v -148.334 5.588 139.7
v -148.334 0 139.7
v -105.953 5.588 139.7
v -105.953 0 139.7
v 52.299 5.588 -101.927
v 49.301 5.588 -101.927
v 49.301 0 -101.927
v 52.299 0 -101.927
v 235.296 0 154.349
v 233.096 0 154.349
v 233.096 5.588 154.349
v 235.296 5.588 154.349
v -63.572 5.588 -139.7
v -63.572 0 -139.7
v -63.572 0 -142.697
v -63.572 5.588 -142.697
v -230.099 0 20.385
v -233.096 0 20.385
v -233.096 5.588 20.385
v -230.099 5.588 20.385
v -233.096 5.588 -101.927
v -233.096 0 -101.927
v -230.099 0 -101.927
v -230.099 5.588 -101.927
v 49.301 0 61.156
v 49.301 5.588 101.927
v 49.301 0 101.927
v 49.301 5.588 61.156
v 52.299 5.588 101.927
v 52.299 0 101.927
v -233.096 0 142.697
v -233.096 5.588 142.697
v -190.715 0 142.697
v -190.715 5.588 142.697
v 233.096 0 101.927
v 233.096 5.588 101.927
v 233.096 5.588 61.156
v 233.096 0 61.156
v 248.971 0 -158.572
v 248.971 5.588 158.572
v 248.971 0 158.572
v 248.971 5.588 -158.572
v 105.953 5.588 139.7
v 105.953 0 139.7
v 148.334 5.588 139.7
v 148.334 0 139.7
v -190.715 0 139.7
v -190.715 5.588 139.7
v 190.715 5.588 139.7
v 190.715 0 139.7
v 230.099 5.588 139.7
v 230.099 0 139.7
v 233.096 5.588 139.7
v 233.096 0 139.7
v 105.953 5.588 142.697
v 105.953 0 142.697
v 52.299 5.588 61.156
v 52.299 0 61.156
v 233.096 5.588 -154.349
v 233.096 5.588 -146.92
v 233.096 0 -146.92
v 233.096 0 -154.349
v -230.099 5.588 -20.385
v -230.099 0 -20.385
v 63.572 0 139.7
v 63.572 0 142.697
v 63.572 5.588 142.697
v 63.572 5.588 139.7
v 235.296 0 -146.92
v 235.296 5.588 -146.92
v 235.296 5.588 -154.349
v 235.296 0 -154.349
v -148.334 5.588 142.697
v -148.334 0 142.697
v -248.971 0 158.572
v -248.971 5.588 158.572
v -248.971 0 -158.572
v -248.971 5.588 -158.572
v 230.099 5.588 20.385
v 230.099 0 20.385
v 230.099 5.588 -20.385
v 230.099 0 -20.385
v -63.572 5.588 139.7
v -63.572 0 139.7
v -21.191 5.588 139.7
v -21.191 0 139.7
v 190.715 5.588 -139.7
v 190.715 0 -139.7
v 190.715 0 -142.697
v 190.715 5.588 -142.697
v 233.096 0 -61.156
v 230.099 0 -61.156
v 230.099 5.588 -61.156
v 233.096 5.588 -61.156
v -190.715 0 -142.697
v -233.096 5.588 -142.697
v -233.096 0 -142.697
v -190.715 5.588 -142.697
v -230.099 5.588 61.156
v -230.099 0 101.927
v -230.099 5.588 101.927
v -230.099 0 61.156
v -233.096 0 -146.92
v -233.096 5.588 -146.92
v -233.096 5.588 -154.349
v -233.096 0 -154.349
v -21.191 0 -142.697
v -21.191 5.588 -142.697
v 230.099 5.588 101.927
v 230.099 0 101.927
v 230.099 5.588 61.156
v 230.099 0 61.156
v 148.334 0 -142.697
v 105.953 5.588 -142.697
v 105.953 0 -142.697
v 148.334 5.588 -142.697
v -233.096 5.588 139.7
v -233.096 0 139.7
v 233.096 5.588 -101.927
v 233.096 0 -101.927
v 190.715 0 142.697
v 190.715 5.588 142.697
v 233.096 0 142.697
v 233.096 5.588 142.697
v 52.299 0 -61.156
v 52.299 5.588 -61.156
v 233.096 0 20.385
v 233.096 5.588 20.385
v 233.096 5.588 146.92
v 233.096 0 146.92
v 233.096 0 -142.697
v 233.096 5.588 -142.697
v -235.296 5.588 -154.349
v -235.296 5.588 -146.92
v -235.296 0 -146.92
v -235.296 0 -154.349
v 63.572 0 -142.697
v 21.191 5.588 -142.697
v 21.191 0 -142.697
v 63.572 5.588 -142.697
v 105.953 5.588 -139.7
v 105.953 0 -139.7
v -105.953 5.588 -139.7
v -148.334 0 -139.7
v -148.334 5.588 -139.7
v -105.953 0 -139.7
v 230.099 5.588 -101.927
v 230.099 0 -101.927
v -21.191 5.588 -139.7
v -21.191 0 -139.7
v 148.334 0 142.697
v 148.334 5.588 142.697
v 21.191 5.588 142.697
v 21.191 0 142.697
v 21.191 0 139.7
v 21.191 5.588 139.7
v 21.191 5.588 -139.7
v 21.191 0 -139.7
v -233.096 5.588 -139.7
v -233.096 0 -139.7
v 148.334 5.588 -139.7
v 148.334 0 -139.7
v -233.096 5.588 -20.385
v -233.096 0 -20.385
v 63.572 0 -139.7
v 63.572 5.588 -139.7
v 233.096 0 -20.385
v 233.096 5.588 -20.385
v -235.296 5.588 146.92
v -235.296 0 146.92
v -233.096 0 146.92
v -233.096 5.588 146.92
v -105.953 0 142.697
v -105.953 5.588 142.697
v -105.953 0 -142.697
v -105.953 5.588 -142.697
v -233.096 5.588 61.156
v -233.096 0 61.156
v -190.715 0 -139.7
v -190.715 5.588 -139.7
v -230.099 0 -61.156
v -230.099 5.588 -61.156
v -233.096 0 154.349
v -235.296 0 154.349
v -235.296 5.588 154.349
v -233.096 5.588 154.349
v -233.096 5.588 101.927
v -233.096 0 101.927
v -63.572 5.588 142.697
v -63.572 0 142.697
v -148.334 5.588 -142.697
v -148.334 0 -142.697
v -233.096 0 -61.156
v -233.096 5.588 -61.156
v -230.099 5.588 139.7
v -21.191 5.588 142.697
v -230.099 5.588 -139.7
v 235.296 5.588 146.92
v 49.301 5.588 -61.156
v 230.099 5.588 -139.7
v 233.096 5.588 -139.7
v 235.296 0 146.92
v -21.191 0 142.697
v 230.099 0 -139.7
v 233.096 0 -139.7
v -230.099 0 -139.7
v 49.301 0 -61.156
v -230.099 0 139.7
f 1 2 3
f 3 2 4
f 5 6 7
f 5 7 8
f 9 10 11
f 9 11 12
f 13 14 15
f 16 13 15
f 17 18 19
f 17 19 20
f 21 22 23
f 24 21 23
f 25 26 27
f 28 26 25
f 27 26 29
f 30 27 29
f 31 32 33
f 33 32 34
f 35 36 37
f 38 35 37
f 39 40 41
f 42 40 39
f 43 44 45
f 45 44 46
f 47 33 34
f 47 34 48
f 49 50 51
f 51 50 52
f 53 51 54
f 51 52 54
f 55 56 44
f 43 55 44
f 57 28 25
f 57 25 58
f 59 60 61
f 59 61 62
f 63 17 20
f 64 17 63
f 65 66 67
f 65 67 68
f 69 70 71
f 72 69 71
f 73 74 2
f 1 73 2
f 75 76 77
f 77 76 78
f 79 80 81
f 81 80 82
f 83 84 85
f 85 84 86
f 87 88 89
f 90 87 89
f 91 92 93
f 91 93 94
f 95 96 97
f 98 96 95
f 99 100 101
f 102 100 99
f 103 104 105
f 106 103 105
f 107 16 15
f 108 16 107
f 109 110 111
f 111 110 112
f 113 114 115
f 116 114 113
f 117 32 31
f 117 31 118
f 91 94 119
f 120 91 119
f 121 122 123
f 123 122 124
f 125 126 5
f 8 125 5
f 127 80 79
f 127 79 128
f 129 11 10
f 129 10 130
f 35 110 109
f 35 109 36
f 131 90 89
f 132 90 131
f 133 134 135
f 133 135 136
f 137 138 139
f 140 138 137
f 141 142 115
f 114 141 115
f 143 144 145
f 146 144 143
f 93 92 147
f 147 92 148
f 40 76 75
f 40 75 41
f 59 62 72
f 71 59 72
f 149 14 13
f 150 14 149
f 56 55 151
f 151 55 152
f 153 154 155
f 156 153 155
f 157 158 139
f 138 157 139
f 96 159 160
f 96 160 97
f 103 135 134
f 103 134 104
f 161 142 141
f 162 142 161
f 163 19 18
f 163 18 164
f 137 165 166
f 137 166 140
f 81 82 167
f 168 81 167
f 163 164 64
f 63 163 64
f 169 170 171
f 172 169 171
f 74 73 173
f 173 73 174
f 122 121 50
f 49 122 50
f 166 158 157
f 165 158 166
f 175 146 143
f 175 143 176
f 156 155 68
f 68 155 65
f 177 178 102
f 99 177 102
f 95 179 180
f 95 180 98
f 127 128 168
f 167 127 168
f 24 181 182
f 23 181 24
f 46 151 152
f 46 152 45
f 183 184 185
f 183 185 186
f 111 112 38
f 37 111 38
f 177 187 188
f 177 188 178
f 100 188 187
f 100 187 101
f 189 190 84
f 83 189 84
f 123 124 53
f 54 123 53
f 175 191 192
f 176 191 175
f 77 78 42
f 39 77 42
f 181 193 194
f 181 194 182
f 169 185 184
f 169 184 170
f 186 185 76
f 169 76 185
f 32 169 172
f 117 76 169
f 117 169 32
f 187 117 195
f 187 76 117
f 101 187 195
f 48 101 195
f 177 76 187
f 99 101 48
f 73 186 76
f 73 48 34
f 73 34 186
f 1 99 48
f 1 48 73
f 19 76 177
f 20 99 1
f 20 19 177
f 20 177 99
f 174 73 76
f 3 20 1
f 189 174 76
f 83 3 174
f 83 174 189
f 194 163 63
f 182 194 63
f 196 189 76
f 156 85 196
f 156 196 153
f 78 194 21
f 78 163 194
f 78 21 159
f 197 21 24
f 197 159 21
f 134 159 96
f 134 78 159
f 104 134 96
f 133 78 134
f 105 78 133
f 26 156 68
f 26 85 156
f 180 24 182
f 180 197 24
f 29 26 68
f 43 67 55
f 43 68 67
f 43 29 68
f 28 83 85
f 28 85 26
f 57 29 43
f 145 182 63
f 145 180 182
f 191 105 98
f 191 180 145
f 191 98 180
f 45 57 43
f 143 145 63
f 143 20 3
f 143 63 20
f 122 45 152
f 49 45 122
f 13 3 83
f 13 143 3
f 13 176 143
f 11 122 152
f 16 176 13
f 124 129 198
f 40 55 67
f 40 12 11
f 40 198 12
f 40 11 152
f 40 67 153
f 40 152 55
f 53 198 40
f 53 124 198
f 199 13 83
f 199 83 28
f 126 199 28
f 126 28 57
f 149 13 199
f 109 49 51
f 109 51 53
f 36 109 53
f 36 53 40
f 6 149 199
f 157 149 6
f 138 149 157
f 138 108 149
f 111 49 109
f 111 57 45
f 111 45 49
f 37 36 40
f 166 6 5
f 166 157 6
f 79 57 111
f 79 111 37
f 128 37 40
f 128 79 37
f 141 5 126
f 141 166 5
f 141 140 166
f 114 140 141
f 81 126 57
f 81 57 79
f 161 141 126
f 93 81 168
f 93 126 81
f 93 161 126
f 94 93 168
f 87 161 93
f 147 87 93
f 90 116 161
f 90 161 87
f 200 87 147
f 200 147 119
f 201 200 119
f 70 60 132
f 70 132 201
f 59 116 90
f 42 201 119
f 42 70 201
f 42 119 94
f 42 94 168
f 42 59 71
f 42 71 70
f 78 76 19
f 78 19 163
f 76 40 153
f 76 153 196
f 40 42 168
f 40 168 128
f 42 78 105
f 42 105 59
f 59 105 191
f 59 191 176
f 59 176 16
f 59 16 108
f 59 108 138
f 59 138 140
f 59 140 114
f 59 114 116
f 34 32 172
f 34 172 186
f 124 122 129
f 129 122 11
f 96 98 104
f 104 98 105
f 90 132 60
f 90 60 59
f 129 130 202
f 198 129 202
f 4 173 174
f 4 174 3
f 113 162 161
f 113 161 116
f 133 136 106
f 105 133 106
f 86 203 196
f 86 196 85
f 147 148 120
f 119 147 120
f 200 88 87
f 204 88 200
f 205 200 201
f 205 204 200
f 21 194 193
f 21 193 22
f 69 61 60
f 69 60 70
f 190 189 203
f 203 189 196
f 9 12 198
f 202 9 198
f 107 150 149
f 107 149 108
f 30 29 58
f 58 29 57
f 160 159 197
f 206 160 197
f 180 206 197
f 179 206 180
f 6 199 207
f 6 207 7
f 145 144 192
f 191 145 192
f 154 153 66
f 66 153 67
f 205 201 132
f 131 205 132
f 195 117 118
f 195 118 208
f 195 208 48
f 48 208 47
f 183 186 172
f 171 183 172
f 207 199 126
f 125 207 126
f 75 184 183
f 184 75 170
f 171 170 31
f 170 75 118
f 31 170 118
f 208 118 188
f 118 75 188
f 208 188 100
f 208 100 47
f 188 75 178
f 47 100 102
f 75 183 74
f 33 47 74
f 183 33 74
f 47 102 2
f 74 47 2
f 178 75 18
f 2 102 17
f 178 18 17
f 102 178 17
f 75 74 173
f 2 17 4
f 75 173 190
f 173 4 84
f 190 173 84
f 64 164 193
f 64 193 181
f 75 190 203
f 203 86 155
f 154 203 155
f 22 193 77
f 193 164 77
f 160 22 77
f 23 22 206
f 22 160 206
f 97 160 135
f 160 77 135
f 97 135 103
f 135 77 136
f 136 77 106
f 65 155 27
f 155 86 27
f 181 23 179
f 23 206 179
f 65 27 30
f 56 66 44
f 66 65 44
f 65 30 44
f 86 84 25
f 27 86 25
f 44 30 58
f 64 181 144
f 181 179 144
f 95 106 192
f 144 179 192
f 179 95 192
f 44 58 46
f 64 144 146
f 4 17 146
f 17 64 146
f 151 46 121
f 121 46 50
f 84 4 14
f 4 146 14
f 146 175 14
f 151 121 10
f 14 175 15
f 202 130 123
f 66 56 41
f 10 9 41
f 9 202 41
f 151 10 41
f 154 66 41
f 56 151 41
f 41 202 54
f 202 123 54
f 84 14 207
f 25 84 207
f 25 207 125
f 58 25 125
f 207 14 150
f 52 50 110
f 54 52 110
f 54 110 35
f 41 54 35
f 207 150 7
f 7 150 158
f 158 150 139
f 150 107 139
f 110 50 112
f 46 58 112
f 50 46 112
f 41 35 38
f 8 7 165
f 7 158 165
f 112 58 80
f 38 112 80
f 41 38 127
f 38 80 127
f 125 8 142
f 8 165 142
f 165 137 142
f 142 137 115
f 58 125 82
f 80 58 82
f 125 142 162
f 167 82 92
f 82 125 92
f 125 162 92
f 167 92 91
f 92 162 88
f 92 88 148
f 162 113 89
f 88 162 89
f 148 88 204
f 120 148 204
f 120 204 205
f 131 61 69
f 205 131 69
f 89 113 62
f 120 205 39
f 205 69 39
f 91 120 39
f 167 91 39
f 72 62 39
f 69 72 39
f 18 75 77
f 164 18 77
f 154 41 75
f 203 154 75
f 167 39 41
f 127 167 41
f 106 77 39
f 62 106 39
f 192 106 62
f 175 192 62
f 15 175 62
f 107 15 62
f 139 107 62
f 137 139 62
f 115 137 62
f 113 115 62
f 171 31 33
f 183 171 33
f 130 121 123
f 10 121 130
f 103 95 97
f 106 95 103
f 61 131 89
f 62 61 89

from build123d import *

# Parameters (mm, degrees)
SKETCH2_W           = 460.1972
SKETCH2_H           = 279.4
SKETCH2_W_2         = 42.381054546
SKETCH2_H_2         = 2.9972
SKETCH2_W_3         = 2.9972
SKETCH2_H_3         = 37.773428571
SKETCH2_H_4         = 40.770628571
BOSS_EXTRUDE1_DEPTH = 5.588
SKETCH3_W           = 2.9972
SKETCH3_H           = 40.770628572
CUT_EXTRUDE1_DEPTH  = 274.363071042
SKETCH4_W           = 497.9416
SKETCH4_H           = 317.1444
SKETCH4_W_2         = 2.2
SKETCH4_H_2         = 7.4295
SKETCH4_W_3         = 466.1916
SKETCH4_H_3         = 285.3944
BOSS_EXTRUDE2_DEPTH = 5.588


with BuildPart() as part:
    # Sketch2 → Boss-Extrude1 (new body)
    with BuildSketch(Plane(origin=(0, 0, 0), x_dir=(1, 0, 0), z_dir=(0, 1, 0))):
        Rectangle(SKETCH2_W, SKETCH2_H)
        with Locations((-169.524218182, 141.1986)):
            Rectangle(SKETCH2_W_2, SKETCH2_H_2)
        with Locations((-231.5972, 120.813285715)):
            Rectangle(SKETCH2_W_3, SKETCH2_H_3)
        with Locations((-231.5972, 40.770628572)):
            Rectangle(SKETCH2_W_3, SKETCH2_H_4)
        with Locations((-231.5972, -40.770628572)):
            Rectangle(SKETCH2_W_3, SKETCH2_H_4)
        with Locations((-84.762109091, 141.1986)):
            Rectangle(SKETCH2_W_2, SKETCH2_H_2)
        with Locations((0, 141.1986)):
            Rectangle(SKETCH2_W_2, SKETCH2_H_2)
        with Locations((84.762109091, 141.1986)):
            Rectangle(SKETCH2_W_2, SKETCH2_H_2)
        with Locations((169.524218182, 141.1986)):
            Rectangle(SKETCH2_W_2, SKETCH2_H_2)
        with Locations((169.524218182, -141.1986)):
            Rectangle(SKETCH2_W_2, SKETCH2_H_2)
        with Locations((84.762109091, -141.1986)):
            Rectangle(SKETCH2_W_2, SKETCH2_H_2)
        with Locations((0, -141.1986)):
            Rectangle(SKETCH2_W_2, SKETCH2_H_2)
        with Locations((-84.762109091, -141.1986)):
            Rectangle(SKETCH2_W_2, SKETCH2_H_2)
        with Locations((-169.524218182, -141.1986)):
            Rectangle(SKETCH2_W_2, SKETCH2_H_2)
        with Locations((-231.5972, -120.813285715)):
            Rectangle(SKETCH2_W_3, SKETCH2_H_3)
        with Locations((231.5972, -120.813285715)):
            Rectangle(SKETCH2_W_3, SKETCH2_H_3)
        with Locations((231.5972, -40.770628572)):
            Rectangle(SKETCH2_W_3, SKETCH2_H_4)
        with Locations((231.5972, 40.770628572)):
            Rectangle(SKETCH2_W_3, SKETCH2_H_4)
        with Locations((231.5972, 120.813285715)):
            Rectangle(SKETCH2_W_3, SKETCH2_H_3)
    extrude(amount=BOSS_EXTRUDE1_DEPTH)

    # Sketch3 → Cut-Extrude1 (cut, through all)
    with BuildSketch(Plane(origin=(0, 5.588, 0), x_dir=(1, 0, 0), z_dir=(0, 1, 0))):
        with Locations((50.8, -81.541257143)):
            Rectangle(SKETCH3_W, SKETCH3_H)
        with Locations((50.8, 81.541257143)):
            Rectangle(SKETCH3_W, SKETCH3_H)
    extrude(amount=-CUT_EXTRUDE1_DEPTH, mode=Mode.SUBTRACT)

    # Sketch4 → Boss-Extrude2 (add)
    with BuildSketch(Plane(origin=(0, 5.588, 0), x_dir=(1, 0, 0), z_dir=(0, 1, 0))):
        Rectangle(SKETCH4_W, SKETCH4_H)
        with Locations((-234.1958, 150.6347)):
            Rectangle(SKETCH4_W_2, SKETCH4_H_2, mode=Mode.SUBTRACT)
        Rectangle(SKETCH4_W_3, SKETCH4_H_3, mode=Mode.SUBTRACT)
        with Locations((234.1958, -150.6347)):
            Rectangle(SKETCH4_W_2, SKETCH4_H_2, mode=Mode.SUBTRACT)
        with Locations((-234.1958, -150.6347)):
            Rectangle(SKETCH4_W_2, SKETCH4_H_2, mode=Mode.SUBTRACT)
        with Locations((234.1958, 150.6347)):
            Rectangle(SKETCH4_W_2, SKETCH4_H_2, mode=Mode.SUBTRACT)
    extrude(amount=-BOSS_EXTRUDE2_DEPTH)


solid = part.part
